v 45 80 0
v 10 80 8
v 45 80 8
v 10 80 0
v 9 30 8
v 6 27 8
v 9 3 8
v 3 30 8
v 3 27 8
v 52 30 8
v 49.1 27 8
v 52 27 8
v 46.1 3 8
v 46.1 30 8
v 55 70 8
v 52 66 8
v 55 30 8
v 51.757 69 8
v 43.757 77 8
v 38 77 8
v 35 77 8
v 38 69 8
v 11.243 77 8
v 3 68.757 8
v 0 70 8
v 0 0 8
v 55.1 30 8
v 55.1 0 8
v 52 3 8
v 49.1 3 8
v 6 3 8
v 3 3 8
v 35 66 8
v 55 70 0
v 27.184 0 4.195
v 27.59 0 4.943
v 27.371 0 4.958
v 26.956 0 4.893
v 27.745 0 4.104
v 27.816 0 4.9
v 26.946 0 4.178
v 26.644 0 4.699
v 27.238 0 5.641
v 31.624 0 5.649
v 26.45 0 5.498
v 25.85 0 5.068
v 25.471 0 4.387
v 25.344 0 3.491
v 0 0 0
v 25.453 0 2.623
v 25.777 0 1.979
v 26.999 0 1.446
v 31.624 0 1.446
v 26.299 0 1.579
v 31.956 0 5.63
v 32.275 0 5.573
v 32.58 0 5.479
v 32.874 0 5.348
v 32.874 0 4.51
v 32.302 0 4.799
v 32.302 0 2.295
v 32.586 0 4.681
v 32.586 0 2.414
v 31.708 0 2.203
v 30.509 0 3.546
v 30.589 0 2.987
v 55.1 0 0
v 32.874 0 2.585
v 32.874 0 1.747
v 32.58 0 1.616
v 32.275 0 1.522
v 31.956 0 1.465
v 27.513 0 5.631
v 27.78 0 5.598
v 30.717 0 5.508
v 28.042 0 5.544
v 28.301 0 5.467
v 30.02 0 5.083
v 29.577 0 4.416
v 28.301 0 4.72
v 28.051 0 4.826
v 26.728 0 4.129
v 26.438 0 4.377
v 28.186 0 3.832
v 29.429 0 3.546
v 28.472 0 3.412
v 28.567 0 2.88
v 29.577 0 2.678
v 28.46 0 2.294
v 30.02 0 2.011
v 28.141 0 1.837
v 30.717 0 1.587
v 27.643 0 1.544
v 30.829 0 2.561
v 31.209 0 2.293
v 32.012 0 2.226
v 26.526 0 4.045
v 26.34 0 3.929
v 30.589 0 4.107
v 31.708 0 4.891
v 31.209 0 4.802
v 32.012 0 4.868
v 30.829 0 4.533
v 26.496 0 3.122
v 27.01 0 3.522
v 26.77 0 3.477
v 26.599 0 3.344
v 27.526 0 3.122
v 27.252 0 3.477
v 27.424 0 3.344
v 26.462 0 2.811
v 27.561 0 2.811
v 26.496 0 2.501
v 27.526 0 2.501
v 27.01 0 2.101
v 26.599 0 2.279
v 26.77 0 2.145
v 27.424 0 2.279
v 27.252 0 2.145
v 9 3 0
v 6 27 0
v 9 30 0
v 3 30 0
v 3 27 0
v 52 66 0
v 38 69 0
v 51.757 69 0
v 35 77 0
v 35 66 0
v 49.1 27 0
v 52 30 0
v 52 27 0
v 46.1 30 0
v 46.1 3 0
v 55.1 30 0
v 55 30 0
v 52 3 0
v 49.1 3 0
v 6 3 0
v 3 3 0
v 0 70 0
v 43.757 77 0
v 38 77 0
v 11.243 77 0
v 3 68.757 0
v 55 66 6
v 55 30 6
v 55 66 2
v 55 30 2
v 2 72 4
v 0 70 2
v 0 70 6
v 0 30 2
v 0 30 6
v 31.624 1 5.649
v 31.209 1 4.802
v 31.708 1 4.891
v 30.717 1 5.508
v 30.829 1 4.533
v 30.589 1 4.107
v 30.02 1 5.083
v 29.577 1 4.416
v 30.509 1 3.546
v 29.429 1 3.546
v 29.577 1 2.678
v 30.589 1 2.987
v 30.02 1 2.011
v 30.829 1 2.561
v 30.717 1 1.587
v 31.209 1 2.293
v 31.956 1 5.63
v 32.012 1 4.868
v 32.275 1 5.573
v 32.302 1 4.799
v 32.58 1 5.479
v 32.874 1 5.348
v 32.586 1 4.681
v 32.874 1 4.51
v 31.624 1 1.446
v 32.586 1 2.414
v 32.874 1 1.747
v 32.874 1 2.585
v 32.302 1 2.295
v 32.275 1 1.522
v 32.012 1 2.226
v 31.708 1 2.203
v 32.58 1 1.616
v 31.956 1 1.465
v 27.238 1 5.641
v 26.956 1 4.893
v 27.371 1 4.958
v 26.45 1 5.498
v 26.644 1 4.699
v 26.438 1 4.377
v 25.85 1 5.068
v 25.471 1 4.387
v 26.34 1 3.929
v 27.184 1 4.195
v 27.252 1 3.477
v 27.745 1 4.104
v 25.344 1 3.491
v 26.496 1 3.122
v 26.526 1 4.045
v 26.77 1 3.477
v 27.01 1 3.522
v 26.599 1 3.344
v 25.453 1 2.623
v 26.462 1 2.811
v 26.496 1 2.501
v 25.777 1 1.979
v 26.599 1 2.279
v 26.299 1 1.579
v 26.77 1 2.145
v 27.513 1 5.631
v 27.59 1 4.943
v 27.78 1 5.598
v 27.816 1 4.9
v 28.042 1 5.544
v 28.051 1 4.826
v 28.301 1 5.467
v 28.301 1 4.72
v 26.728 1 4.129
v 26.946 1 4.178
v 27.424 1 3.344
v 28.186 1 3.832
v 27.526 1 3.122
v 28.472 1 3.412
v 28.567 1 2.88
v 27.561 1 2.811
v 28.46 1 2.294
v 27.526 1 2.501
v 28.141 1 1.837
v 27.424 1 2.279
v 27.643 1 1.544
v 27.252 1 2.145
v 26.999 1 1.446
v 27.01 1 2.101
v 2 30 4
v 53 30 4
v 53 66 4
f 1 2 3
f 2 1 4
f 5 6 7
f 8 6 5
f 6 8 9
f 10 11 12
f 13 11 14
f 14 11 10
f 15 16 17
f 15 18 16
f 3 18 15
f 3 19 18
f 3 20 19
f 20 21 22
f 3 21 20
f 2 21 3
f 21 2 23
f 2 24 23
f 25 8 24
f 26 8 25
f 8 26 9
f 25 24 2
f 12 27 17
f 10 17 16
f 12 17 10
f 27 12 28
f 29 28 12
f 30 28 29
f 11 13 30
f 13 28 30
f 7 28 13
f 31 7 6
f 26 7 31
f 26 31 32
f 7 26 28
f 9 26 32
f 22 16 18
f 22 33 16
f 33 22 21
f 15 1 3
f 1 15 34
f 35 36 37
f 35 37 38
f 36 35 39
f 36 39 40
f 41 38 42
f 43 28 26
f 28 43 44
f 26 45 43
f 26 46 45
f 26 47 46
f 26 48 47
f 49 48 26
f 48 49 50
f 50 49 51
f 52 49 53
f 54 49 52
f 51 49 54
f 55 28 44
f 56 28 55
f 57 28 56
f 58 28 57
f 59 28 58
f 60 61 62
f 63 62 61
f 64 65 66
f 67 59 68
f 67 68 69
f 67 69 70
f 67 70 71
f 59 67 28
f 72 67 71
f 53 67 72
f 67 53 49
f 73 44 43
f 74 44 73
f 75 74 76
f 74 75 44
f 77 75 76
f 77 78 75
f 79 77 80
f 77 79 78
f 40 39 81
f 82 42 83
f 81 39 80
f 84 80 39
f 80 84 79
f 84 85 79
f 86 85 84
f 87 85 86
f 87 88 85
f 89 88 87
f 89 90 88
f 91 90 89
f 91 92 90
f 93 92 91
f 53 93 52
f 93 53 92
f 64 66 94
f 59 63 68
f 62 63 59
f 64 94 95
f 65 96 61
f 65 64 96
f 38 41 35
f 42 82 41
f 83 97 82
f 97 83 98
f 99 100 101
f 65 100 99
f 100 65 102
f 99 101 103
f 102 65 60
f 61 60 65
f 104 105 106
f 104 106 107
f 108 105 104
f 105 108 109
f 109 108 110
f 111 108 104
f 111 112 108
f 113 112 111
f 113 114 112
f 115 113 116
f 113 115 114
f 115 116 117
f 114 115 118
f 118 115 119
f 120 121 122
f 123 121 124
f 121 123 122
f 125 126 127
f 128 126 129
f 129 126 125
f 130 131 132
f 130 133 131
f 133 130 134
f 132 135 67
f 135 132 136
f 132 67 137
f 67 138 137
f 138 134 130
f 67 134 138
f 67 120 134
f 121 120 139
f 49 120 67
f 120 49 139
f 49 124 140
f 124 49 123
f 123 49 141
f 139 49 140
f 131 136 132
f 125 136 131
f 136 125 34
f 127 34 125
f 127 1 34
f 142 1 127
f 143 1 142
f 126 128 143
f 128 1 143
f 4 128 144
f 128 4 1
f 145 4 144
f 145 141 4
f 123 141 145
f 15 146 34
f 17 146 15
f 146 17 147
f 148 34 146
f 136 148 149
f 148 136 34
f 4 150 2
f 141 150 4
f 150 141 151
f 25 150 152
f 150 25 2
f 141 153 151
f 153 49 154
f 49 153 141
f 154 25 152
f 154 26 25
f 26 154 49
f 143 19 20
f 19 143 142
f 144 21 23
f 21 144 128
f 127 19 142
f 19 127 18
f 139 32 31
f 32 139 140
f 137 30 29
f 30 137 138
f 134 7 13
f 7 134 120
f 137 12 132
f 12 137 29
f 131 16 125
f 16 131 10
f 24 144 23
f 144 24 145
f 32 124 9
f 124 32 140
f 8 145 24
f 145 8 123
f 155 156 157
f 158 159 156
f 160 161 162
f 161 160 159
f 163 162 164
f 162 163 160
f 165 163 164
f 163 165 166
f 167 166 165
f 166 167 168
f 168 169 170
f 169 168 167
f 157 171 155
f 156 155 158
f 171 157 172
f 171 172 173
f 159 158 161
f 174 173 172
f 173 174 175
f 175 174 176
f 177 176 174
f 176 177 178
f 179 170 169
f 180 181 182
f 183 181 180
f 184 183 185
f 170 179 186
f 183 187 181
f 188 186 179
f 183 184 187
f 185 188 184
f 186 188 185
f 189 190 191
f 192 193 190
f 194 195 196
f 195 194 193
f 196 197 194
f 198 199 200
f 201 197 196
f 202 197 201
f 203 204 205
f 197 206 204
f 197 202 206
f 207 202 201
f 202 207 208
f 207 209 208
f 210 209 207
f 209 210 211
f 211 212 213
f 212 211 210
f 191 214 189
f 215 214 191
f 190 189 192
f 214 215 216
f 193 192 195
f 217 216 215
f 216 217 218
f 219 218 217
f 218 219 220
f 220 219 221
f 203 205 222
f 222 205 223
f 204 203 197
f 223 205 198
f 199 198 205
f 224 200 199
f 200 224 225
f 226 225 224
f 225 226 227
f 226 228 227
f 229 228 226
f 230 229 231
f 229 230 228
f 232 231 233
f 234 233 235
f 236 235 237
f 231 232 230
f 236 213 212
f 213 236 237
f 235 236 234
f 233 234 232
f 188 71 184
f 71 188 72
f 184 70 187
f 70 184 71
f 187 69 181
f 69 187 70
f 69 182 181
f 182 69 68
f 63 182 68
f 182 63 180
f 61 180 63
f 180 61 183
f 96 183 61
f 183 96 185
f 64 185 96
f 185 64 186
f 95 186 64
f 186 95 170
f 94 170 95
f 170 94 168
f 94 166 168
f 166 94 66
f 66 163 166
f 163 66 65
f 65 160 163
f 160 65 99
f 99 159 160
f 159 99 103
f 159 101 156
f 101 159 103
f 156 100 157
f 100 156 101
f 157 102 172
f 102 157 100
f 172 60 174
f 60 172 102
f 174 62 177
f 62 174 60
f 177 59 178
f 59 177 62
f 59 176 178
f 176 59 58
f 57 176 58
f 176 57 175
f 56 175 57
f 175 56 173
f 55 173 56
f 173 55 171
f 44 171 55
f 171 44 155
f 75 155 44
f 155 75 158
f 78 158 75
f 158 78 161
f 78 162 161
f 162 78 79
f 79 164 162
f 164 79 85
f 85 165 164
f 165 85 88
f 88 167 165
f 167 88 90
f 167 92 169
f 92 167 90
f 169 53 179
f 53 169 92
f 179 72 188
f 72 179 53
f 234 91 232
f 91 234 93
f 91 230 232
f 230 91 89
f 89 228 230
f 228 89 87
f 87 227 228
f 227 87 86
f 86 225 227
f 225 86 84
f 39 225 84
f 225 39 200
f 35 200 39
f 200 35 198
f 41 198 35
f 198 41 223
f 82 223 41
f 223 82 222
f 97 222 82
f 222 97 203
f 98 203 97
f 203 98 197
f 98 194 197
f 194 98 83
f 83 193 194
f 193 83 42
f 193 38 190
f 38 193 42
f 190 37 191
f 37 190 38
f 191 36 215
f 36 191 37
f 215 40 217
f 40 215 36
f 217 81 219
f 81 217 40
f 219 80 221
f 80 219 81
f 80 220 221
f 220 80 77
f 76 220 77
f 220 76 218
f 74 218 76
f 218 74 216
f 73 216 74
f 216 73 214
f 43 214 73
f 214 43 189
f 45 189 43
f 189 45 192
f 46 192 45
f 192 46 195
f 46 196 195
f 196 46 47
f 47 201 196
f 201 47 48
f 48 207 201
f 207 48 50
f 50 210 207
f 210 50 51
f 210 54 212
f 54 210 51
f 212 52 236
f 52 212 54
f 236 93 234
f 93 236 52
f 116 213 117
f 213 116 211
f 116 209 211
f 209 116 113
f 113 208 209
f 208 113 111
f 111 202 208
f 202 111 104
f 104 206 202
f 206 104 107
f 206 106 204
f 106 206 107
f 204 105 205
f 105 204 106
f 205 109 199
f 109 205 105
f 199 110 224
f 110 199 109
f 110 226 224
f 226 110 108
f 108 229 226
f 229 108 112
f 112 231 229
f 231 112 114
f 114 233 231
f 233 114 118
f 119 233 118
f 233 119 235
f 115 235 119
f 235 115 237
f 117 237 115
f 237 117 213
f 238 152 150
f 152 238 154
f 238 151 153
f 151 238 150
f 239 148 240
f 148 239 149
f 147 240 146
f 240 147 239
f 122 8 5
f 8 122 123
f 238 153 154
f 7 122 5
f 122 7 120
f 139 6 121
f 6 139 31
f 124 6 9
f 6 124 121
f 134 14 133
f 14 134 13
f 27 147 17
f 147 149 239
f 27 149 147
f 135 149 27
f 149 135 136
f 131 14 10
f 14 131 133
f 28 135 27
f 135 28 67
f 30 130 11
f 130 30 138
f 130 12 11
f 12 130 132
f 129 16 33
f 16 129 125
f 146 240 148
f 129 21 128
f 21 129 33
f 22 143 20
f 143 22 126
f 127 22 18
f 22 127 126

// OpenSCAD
tol=0.25;
extra=4;


difference(){   // cut the board and components out of 
    // the base plate #1
    
// Base 1 plate
B1p=[ [0,0], [55,0], [55,70], [45,80],
[10,80], [0,70] ];
translate([0,0,0]) color("gray")
linear_extrude(height=8)
polygon(points=B1p);

// cutout an offset
translate([0,0,-1]) color("blue"){
    difference(){
        linear_extrude(height=12)
        offset(r=-3) polygon(points=B1p);
    }
}

// add text
translate ([25,1,3.5]) color("red") 
    rotate([90,0,0])
    linear_extrude(height=1){
    text("6C", font = "Open Sans:style=Bold", size=4,halign="left",valign="center",spacing=1.1);
    }

// side grooves
    pg1=[ [0,0], [2,2], [0,4] ];
    translate([0,0,6]) color("orange")
    rotate([90,180,180]) linear_extrude(height=80) polygon(points=pg1);

    translate([55,0,2]) color("orange")
    rotate([90,0,180]) linear_extrude(height=80) polygon(points=pg1);
    
} // end of diffence

// left
translate([0,0,0]) color("gray")
difference(){
    linear_extrude(height=8)
    square([9,30]);

    linear_extrude(height=8)
    offset(r=-3) square([9,30]);
}

// right
translate([46.1,0,0]) color("gray")
difference(){
    linear_extrude(height=8)
    square([9,30]);

    linear_extrude(height=8)
    offset(r=-3) square([9,30]);
}

// top
pt1=[ [0,0], [20,0], [20,4], [10,14], [0,14] ];
translate([35,66,0]) color("gray")
difference(){
    linear_extrude(height=8)
    polygon(points=pt1);

    linear_extrude(height=8)
    offset(r=-3) polygon(points=pt1);
}
